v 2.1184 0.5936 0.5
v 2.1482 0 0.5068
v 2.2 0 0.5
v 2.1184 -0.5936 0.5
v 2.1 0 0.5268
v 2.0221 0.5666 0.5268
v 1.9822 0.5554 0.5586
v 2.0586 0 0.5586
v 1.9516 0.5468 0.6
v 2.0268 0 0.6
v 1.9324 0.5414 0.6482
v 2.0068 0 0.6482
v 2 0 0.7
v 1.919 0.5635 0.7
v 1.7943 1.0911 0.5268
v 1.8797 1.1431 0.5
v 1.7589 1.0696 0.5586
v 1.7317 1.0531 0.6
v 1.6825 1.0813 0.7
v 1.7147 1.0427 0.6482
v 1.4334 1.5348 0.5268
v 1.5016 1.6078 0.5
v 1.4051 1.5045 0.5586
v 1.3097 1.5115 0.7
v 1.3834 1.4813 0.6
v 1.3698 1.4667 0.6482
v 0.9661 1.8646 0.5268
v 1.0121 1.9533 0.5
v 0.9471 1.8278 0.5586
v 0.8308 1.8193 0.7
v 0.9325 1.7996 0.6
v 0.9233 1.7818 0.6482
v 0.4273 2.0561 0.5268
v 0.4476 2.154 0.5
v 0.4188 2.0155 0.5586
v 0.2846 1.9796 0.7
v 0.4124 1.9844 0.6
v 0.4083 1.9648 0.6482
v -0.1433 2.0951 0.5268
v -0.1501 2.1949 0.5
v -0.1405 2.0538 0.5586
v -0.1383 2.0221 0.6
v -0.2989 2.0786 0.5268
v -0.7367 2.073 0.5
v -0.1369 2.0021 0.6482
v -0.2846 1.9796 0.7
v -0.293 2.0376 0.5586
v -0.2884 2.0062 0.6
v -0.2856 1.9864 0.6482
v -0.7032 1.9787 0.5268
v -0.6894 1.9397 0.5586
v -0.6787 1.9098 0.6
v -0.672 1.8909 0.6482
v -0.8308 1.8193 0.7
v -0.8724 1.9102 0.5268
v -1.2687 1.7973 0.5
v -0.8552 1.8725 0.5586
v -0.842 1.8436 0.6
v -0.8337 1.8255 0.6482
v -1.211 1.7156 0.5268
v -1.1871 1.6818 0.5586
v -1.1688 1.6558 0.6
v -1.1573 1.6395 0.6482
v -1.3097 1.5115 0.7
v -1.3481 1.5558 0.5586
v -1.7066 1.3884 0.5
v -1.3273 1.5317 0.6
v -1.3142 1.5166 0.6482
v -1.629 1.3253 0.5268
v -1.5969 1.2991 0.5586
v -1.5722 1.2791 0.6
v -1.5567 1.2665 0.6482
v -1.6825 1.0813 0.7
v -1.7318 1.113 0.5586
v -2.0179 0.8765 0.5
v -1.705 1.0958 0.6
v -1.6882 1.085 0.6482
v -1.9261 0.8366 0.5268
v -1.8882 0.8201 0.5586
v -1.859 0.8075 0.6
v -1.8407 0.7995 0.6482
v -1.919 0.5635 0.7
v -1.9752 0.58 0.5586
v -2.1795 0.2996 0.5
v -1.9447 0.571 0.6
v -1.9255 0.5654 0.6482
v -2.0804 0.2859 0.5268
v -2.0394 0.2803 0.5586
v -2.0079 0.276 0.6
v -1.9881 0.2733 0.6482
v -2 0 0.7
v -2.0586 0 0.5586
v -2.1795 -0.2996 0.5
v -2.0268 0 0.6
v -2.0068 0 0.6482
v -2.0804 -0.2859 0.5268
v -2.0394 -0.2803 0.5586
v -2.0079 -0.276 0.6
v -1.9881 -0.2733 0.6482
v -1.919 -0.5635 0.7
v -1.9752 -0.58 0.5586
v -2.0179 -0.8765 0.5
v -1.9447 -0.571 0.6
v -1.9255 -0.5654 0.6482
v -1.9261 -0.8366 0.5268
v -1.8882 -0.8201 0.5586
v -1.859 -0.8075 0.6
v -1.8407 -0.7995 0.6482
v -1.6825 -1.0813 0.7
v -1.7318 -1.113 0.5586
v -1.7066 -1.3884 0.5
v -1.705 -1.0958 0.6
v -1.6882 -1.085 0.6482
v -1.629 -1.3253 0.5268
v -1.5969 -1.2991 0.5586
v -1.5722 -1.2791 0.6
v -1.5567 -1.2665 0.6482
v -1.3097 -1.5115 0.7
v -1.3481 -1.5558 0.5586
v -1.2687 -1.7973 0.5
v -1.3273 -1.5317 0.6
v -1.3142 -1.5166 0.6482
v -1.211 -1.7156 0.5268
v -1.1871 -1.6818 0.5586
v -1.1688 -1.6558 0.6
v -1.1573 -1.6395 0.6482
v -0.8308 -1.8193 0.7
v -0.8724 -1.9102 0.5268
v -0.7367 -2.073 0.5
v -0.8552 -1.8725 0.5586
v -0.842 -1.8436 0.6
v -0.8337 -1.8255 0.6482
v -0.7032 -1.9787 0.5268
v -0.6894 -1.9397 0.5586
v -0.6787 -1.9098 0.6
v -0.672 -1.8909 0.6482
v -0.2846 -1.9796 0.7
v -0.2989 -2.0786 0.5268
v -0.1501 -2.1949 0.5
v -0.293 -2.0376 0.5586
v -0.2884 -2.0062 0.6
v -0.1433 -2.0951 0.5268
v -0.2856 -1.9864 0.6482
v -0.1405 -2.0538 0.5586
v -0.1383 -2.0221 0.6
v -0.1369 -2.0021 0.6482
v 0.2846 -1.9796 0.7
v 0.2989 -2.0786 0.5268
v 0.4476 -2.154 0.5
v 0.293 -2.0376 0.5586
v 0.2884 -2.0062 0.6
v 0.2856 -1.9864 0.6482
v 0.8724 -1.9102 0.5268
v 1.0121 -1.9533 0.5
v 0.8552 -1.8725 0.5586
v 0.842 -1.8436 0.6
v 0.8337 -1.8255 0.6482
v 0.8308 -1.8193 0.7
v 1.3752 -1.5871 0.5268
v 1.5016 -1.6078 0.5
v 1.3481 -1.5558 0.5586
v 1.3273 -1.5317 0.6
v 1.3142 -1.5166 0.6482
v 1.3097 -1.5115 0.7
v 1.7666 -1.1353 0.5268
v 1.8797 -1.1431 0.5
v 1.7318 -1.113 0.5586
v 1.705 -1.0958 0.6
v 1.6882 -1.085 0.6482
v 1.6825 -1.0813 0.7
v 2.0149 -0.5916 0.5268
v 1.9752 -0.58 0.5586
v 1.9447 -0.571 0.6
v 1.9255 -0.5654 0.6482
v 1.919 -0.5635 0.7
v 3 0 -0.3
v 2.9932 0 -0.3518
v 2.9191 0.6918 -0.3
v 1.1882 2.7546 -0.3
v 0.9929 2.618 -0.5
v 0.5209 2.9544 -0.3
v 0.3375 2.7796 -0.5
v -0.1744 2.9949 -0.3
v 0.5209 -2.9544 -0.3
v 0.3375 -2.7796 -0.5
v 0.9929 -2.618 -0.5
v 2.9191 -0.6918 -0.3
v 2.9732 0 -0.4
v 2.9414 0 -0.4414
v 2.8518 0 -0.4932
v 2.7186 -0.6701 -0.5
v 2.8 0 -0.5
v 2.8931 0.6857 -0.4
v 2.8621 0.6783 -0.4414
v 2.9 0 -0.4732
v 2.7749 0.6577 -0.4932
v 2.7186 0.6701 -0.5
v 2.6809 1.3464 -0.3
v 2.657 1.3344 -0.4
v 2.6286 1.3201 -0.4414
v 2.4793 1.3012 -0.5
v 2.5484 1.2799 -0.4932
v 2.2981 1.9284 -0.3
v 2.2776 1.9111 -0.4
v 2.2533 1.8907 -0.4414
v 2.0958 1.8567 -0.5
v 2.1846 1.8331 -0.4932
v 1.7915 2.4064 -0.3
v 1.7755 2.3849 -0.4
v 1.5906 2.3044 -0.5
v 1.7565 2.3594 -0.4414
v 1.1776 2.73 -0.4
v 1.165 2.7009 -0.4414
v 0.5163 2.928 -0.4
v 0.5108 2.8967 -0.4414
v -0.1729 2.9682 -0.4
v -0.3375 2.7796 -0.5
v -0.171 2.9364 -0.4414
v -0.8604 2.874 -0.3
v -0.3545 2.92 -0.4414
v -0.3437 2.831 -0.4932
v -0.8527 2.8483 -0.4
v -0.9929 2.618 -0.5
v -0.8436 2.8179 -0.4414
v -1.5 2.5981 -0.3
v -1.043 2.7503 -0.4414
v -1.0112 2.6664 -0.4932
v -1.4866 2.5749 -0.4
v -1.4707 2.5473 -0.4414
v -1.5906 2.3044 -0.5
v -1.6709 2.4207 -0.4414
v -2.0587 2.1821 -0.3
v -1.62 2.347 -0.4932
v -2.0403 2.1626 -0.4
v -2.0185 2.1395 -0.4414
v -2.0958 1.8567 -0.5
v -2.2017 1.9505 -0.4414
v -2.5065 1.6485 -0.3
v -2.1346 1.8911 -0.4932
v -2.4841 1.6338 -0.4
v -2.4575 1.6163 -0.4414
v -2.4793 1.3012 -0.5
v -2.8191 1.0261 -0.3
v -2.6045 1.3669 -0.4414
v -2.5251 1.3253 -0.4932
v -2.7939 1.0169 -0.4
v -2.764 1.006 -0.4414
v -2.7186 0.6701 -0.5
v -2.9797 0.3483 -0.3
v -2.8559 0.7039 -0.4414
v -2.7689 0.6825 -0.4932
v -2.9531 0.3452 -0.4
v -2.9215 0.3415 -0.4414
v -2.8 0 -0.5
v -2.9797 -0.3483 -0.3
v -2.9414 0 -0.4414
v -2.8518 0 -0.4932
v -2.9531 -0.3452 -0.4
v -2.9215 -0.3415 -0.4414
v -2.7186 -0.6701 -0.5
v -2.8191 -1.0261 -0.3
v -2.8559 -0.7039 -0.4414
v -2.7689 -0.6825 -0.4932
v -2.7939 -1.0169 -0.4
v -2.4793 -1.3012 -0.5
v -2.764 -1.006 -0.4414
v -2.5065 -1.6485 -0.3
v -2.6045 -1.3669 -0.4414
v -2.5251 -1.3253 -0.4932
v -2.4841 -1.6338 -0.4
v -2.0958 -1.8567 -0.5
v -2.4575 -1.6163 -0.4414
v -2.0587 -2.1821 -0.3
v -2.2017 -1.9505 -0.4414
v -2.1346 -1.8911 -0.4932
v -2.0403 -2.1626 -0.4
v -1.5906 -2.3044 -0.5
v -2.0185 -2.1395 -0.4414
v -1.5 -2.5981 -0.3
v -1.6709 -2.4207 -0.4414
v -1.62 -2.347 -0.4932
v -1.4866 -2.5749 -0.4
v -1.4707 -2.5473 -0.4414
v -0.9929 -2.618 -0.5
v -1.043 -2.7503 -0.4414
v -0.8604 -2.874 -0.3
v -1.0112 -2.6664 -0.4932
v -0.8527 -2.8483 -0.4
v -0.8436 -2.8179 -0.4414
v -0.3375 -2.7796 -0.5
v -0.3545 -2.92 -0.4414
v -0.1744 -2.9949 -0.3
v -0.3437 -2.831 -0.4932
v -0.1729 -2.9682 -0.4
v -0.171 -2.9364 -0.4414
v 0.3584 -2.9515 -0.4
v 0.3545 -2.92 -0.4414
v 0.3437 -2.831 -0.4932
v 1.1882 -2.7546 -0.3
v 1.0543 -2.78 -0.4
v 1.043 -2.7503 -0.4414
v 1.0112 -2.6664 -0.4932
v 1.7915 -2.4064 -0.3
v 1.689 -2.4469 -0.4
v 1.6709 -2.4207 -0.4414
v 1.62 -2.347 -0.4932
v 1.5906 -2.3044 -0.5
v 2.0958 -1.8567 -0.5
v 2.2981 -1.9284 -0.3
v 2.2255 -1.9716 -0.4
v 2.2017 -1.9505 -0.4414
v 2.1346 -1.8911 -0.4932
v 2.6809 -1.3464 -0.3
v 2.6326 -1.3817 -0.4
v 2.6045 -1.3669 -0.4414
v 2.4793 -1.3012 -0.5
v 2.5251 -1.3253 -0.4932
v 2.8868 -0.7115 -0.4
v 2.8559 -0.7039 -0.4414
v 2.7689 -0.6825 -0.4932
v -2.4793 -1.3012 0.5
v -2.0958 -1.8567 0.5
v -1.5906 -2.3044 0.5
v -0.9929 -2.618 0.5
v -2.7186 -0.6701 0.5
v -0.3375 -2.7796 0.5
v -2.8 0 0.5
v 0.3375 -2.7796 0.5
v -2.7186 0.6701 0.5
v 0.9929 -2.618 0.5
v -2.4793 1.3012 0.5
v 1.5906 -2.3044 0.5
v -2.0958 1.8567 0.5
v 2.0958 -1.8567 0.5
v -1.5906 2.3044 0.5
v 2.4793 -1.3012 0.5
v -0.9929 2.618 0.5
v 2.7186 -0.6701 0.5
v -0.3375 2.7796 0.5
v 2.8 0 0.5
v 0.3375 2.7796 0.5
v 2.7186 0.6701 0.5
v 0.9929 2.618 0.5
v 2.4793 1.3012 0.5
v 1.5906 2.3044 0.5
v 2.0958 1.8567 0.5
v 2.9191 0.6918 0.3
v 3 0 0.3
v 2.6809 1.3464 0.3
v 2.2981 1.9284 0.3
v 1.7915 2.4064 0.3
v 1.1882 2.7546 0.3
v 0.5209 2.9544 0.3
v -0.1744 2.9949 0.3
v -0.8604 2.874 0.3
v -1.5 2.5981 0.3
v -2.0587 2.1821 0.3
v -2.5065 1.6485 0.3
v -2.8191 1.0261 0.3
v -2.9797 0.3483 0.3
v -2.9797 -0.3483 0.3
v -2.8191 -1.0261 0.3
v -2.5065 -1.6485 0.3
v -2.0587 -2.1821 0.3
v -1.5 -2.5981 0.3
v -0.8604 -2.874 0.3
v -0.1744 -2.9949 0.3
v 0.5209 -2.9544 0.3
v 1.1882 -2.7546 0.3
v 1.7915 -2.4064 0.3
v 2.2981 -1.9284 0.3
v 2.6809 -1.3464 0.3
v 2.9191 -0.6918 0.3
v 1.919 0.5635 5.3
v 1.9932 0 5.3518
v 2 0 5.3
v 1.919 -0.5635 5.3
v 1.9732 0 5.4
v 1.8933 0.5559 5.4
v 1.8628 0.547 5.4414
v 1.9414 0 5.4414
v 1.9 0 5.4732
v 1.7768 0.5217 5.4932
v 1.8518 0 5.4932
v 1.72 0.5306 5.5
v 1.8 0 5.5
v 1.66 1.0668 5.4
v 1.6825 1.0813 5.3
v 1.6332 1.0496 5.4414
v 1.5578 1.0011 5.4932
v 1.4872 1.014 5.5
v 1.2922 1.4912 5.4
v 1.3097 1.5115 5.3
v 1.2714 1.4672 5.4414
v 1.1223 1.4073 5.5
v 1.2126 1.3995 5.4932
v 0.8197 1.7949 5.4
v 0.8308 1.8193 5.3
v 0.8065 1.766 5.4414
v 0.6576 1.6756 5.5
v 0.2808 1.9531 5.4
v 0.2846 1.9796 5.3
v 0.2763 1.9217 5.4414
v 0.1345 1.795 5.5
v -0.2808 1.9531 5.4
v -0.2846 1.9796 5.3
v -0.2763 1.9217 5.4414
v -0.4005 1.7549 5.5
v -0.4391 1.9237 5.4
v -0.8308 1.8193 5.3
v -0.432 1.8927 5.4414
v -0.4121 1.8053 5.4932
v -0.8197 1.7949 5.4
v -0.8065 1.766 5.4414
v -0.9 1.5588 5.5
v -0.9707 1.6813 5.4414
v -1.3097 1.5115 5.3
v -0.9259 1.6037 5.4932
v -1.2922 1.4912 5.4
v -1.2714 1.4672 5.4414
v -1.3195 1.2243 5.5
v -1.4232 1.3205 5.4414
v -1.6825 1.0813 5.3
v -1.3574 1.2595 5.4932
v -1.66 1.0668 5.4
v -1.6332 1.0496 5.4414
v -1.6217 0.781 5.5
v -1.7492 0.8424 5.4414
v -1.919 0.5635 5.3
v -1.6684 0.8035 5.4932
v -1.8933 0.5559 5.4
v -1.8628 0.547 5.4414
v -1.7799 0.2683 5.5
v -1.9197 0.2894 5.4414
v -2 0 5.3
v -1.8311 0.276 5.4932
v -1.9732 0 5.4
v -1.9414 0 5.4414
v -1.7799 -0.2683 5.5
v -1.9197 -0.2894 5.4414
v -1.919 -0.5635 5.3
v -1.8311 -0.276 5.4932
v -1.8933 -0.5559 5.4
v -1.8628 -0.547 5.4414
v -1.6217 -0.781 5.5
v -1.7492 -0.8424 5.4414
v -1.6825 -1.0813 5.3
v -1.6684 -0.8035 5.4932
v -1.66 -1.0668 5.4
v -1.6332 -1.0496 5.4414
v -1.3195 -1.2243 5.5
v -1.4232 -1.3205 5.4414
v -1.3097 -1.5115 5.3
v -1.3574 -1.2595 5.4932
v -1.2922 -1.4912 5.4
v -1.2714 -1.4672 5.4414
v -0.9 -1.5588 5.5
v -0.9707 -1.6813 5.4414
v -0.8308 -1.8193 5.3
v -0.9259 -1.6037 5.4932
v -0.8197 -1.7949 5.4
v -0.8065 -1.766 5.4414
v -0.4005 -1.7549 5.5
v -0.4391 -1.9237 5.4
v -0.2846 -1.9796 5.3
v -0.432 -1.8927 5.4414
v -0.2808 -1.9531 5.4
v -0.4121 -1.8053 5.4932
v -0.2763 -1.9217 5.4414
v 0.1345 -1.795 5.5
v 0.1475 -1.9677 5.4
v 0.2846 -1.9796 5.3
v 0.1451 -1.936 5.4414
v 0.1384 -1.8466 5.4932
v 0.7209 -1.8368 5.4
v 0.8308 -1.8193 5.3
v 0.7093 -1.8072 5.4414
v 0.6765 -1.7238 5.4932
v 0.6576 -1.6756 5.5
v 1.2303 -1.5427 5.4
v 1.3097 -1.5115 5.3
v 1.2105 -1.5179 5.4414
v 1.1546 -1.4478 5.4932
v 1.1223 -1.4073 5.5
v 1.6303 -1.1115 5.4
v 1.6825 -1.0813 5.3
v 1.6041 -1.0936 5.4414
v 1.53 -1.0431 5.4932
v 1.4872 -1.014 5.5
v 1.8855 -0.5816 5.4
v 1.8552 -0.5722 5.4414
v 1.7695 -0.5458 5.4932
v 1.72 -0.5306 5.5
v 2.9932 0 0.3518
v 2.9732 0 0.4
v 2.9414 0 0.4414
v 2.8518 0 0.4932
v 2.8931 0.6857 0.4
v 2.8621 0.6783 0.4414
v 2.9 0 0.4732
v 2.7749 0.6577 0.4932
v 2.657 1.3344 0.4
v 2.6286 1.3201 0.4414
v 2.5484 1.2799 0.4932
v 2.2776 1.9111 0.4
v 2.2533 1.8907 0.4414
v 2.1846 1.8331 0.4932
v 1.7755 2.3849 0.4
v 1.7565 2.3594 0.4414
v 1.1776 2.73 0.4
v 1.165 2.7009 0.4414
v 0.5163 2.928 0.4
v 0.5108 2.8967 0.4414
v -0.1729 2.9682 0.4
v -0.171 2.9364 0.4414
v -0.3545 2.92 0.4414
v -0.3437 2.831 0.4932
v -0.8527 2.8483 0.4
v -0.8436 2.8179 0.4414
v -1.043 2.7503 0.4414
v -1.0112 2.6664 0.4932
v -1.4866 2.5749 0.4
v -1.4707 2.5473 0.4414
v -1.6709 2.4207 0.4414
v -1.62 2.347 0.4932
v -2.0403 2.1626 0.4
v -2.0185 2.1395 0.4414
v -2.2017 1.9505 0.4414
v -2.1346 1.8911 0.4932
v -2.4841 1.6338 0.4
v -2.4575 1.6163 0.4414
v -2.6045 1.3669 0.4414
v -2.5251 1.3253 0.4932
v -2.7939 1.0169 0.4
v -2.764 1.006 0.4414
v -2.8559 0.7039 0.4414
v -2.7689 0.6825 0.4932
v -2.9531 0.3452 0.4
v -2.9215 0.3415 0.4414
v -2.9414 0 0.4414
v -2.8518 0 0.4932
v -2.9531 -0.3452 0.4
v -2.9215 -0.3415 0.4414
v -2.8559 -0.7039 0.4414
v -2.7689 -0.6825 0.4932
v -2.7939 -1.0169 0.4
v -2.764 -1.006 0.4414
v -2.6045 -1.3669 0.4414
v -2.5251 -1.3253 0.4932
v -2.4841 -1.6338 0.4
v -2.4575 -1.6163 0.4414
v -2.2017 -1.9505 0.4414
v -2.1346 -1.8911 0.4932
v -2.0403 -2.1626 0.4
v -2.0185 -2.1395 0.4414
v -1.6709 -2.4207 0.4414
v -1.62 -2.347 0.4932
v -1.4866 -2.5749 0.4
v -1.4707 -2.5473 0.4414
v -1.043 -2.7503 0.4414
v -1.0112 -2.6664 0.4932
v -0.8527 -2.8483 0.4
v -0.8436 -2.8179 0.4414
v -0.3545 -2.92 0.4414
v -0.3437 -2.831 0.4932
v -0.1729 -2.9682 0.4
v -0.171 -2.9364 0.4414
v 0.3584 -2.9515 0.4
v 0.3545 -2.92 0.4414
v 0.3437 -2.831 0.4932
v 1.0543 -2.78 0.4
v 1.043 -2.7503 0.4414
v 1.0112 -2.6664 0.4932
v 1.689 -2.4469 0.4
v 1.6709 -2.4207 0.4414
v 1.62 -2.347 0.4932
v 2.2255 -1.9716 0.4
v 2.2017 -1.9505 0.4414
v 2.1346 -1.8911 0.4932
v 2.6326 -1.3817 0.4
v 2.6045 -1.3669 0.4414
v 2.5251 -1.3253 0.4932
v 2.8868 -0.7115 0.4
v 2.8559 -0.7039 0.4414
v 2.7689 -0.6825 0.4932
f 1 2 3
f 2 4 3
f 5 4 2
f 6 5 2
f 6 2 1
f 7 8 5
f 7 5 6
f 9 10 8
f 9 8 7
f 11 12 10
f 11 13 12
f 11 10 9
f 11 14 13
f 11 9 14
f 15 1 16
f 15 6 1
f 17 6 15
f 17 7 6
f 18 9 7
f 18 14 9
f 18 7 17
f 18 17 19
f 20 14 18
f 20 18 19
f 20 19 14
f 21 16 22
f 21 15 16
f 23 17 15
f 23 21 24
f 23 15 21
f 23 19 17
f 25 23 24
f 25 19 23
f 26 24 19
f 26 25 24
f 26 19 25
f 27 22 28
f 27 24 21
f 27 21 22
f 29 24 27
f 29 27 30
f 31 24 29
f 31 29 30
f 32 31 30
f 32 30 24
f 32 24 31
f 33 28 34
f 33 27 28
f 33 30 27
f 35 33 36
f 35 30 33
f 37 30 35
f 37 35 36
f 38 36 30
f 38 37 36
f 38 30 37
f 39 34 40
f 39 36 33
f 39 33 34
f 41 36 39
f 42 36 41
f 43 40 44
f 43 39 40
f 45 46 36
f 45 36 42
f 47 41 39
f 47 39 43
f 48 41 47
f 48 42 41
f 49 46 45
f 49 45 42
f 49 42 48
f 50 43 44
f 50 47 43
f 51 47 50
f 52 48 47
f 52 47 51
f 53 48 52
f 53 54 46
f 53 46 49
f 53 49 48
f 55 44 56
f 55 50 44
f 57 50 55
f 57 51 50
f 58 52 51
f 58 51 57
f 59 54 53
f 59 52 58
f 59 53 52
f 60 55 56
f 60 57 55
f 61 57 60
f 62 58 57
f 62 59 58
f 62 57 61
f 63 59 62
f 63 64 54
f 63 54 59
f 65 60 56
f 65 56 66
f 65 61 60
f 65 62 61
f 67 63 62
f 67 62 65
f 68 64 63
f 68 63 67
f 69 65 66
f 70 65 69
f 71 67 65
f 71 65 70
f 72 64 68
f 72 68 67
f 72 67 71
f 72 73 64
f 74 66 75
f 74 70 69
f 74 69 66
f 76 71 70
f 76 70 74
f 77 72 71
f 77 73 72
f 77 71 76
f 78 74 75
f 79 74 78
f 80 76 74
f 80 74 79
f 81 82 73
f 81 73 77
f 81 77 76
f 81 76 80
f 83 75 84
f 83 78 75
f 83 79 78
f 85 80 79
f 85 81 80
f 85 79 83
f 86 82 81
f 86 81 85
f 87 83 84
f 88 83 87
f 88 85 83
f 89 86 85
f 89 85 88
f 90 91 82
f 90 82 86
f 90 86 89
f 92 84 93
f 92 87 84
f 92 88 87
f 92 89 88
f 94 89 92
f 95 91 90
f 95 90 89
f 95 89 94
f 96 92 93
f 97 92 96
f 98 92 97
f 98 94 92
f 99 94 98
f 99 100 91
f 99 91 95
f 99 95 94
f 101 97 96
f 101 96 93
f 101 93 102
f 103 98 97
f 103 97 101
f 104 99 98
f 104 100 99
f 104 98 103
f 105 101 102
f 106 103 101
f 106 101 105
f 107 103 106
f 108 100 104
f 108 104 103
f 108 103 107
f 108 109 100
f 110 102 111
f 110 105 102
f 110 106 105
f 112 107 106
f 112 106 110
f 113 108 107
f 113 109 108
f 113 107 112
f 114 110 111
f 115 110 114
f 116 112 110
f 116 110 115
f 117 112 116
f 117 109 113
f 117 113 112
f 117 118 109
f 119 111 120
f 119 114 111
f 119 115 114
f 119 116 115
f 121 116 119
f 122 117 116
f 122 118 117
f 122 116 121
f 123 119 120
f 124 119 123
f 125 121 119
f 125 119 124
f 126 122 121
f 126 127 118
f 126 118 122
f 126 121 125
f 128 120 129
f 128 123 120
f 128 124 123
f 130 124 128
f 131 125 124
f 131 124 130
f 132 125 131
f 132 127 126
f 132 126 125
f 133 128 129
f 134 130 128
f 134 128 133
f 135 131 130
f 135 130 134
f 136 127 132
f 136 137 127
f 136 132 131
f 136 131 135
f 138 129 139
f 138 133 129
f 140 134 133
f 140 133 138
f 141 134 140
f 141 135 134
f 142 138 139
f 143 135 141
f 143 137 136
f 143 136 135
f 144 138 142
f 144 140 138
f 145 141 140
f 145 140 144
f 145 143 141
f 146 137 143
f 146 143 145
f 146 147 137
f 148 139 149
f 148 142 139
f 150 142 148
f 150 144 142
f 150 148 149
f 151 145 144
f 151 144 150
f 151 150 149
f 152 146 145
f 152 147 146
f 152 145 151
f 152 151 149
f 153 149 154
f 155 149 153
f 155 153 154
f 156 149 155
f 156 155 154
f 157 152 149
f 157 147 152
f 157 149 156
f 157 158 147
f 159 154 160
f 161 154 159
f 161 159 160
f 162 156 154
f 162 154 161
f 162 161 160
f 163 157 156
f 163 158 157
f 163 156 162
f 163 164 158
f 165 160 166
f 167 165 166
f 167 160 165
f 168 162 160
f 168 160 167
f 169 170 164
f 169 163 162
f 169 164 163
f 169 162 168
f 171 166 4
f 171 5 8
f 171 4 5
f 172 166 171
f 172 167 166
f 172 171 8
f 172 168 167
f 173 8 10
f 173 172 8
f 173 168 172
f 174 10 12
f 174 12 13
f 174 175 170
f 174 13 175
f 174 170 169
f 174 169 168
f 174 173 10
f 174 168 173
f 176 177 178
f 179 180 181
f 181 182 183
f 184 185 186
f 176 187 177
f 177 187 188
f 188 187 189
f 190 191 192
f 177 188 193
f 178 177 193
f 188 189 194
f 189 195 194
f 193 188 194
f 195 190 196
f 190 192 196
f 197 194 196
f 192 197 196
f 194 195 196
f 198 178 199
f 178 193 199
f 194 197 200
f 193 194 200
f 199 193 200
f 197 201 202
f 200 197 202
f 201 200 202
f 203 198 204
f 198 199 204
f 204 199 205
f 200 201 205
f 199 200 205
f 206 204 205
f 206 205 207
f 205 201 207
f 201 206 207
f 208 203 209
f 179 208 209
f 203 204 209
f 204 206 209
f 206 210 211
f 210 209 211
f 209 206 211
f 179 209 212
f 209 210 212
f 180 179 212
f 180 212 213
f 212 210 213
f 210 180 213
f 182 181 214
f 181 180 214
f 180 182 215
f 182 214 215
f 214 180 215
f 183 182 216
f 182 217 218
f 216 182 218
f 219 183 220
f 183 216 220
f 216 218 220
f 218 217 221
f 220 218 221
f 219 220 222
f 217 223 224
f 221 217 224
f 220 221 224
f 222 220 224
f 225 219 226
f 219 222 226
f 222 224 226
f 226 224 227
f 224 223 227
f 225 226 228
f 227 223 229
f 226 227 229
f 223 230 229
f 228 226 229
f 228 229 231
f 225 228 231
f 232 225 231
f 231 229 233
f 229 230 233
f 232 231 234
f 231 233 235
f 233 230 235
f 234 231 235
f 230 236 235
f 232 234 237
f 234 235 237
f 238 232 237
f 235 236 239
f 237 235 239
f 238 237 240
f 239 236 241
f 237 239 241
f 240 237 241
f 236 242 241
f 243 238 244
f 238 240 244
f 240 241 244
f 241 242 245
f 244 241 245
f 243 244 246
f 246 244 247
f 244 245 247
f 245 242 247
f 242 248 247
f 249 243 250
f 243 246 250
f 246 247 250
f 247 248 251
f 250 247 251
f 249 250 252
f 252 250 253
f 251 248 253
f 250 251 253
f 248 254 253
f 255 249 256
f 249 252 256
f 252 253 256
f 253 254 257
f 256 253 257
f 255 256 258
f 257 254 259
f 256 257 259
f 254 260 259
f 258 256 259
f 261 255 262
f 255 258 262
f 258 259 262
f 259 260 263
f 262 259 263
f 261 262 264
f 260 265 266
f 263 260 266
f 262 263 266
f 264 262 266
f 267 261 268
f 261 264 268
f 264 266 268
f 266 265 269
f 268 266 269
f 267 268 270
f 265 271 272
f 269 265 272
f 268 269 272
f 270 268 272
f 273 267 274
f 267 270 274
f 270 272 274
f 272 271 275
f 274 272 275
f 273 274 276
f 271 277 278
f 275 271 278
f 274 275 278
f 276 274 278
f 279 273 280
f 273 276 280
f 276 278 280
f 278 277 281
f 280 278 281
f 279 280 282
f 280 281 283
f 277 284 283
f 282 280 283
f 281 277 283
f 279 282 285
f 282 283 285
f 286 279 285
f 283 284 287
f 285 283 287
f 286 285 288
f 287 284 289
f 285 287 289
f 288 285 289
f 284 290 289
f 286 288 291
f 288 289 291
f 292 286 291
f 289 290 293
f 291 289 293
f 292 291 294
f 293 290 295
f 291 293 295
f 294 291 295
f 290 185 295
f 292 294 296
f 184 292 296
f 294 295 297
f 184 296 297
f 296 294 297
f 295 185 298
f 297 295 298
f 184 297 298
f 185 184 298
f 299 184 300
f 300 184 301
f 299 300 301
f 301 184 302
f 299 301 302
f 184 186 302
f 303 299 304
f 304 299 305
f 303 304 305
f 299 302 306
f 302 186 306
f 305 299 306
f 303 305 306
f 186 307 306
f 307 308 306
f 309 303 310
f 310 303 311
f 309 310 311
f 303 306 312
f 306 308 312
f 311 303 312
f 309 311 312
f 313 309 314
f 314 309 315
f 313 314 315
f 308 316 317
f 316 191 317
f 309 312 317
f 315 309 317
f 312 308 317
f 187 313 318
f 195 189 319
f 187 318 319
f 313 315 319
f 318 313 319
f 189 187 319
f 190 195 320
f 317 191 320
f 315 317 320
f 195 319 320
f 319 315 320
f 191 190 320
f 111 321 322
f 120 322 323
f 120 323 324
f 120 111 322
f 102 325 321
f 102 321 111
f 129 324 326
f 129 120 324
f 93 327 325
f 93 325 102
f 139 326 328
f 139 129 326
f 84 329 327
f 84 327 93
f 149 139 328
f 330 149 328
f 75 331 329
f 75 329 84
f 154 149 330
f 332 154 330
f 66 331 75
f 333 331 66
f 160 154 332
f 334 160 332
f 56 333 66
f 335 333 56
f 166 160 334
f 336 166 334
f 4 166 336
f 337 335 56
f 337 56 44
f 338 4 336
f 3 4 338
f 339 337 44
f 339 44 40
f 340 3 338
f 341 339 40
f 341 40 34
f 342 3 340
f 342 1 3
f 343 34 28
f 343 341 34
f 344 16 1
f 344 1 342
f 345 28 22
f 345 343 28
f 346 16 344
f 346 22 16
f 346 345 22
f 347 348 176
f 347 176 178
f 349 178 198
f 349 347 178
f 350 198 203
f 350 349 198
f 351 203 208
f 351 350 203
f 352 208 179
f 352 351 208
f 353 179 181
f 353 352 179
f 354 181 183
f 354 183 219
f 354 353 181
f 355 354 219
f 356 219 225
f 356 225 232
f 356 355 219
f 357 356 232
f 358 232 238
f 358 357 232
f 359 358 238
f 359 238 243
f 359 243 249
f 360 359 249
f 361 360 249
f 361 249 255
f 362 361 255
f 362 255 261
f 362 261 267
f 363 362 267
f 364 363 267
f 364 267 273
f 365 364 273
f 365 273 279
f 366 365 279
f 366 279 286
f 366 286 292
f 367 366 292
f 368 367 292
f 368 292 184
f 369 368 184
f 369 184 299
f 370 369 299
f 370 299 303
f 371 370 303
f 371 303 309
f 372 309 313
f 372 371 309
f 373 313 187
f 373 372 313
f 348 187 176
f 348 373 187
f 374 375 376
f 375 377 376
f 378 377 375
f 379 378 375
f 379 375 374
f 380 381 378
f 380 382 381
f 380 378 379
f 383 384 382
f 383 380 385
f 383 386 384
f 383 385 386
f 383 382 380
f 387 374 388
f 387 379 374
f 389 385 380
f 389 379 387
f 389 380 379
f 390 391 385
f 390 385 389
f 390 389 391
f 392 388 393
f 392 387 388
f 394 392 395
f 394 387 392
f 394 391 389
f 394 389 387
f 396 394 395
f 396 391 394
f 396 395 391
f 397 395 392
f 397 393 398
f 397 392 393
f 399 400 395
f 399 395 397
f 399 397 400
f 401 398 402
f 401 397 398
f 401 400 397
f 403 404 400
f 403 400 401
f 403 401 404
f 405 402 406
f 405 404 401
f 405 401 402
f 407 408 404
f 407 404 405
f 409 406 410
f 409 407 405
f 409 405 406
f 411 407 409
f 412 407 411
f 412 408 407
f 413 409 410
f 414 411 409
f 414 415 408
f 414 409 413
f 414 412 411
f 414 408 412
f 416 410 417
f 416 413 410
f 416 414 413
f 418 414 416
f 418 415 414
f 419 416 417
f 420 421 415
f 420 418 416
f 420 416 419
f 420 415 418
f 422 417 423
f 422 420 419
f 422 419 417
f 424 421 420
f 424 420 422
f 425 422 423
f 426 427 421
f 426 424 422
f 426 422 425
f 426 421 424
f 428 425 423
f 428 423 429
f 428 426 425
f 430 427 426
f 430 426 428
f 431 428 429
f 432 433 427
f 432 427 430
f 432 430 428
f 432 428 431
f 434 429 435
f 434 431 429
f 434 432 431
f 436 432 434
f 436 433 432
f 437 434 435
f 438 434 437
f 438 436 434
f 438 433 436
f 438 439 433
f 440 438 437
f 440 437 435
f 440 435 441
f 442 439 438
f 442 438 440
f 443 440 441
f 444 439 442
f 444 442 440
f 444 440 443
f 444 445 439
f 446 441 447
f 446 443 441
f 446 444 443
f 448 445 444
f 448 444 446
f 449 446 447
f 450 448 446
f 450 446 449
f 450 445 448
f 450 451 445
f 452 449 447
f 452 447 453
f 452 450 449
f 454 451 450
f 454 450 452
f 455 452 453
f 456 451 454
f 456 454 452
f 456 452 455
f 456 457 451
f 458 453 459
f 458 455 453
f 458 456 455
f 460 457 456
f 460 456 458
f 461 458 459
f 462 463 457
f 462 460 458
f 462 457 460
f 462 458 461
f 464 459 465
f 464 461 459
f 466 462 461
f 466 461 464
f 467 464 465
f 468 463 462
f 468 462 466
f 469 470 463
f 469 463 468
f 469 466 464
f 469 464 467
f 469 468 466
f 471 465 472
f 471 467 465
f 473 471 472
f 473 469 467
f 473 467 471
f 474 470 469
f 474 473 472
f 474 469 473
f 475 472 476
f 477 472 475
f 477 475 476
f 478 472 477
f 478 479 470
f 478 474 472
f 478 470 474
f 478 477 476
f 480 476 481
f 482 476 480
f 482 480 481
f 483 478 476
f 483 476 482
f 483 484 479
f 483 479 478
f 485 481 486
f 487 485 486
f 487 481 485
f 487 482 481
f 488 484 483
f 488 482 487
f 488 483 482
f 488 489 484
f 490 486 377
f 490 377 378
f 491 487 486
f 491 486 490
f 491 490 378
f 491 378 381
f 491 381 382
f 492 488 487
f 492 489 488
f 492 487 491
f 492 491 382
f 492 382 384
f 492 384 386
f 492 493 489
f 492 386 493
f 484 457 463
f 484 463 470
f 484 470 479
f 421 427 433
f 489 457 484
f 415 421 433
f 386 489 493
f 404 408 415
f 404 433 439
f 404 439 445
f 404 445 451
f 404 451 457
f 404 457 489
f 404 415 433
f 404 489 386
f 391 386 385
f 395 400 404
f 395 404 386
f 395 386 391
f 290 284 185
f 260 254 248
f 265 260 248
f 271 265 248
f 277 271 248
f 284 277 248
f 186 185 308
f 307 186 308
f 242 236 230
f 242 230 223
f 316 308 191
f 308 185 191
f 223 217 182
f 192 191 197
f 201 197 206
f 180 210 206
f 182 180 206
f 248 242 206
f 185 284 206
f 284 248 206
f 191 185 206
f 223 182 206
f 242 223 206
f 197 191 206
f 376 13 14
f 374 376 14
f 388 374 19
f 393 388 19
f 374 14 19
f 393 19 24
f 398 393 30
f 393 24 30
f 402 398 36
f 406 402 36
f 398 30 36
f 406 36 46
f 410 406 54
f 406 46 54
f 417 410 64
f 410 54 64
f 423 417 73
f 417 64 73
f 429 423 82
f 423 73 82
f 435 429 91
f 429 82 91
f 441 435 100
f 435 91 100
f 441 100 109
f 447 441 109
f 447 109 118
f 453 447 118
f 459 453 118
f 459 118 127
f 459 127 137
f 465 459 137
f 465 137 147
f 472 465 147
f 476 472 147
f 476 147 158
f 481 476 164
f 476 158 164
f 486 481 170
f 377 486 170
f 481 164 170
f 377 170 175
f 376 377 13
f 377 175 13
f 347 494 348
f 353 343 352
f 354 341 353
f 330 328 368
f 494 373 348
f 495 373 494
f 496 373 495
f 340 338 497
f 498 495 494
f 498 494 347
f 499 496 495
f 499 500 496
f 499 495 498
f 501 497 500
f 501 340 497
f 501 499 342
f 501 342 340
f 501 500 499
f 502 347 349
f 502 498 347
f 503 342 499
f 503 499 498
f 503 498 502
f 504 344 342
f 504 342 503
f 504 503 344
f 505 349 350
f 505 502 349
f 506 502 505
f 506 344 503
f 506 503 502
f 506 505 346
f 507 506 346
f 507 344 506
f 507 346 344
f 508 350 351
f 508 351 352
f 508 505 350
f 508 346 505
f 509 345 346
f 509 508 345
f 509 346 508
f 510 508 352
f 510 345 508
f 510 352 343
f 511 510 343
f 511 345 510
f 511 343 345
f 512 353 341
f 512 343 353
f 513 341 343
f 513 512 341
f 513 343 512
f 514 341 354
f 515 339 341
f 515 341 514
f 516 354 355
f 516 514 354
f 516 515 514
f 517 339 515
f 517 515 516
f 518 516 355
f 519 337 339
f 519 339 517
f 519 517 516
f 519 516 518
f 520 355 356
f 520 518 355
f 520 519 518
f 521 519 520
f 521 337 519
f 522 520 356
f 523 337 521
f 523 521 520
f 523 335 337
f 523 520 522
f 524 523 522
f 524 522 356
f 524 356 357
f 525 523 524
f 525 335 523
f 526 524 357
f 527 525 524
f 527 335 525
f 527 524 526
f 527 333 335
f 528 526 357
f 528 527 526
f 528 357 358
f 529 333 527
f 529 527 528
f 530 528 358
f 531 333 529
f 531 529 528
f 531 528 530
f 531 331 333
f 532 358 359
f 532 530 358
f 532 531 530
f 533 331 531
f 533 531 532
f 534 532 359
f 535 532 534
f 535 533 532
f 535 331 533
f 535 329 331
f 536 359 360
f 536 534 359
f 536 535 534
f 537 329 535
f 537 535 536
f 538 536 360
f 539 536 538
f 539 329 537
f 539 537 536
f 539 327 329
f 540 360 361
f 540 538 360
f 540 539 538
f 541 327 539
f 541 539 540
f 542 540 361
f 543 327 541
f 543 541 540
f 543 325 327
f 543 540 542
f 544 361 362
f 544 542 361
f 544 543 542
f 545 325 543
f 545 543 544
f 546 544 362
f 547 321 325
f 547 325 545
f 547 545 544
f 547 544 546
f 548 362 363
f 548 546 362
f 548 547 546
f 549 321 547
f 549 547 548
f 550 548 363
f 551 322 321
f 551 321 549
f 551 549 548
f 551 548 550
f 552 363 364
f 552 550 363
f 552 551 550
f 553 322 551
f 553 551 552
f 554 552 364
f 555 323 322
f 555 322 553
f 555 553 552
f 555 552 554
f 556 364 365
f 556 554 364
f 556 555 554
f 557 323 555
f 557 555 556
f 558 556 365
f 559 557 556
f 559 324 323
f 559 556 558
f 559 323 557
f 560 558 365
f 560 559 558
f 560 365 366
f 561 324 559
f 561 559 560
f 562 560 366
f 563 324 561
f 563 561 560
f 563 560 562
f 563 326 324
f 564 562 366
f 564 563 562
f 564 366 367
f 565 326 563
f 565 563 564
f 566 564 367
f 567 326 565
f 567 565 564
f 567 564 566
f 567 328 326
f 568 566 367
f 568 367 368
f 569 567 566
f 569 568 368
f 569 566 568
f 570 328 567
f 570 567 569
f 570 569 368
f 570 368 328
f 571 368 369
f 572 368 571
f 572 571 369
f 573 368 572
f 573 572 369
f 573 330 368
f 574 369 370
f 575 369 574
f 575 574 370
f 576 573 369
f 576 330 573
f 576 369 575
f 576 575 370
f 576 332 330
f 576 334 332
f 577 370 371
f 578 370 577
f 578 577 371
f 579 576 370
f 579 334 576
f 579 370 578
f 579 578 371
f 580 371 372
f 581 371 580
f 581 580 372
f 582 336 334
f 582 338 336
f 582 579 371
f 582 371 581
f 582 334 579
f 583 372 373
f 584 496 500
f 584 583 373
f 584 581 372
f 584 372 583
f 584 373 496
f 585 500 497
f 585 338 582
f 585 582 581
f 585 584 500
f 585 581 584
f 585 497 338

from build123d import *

# Parameters (mm, degrees)
SKETCH1_R           = 3
BOSS_EXTRUDE1_DEPTH = 0.5
SKETCH2_R           = 2
BOSS_EXTRUDE2_DEPTH = 5
FILLET1_R           = 0.2


with BuildPart() as part:
    # Sketch1 → Boss-Extrude1 (new, symmetric)
    with BuildSketch(Plane.XY):
        Circle(SKETCH1_R)
    extrude(amount=BOSS_EXTRUDE1_DEPTH, both=True)

    # Sketch2 → Boss-Extrude2 (add)
    with BuildSketch(Plane.XY.offset(0.5)):
        Circle(SKETCH2_R)
    extrude(amount=BOSS_EXTRUDE2_DEPTH)

    # Fillet1
    fillet1_edges = [part.edges().sort_by_distance(p)[0] for p in [
        (-3, 0, -0.5),
        (-3, 0, 0.5),
        (-2, 0, 0.5),
        (-2, 0, 5.5),
    ]]
    fillet(fillet1_edges, radius=FILLET1_R)


solid = part.part
